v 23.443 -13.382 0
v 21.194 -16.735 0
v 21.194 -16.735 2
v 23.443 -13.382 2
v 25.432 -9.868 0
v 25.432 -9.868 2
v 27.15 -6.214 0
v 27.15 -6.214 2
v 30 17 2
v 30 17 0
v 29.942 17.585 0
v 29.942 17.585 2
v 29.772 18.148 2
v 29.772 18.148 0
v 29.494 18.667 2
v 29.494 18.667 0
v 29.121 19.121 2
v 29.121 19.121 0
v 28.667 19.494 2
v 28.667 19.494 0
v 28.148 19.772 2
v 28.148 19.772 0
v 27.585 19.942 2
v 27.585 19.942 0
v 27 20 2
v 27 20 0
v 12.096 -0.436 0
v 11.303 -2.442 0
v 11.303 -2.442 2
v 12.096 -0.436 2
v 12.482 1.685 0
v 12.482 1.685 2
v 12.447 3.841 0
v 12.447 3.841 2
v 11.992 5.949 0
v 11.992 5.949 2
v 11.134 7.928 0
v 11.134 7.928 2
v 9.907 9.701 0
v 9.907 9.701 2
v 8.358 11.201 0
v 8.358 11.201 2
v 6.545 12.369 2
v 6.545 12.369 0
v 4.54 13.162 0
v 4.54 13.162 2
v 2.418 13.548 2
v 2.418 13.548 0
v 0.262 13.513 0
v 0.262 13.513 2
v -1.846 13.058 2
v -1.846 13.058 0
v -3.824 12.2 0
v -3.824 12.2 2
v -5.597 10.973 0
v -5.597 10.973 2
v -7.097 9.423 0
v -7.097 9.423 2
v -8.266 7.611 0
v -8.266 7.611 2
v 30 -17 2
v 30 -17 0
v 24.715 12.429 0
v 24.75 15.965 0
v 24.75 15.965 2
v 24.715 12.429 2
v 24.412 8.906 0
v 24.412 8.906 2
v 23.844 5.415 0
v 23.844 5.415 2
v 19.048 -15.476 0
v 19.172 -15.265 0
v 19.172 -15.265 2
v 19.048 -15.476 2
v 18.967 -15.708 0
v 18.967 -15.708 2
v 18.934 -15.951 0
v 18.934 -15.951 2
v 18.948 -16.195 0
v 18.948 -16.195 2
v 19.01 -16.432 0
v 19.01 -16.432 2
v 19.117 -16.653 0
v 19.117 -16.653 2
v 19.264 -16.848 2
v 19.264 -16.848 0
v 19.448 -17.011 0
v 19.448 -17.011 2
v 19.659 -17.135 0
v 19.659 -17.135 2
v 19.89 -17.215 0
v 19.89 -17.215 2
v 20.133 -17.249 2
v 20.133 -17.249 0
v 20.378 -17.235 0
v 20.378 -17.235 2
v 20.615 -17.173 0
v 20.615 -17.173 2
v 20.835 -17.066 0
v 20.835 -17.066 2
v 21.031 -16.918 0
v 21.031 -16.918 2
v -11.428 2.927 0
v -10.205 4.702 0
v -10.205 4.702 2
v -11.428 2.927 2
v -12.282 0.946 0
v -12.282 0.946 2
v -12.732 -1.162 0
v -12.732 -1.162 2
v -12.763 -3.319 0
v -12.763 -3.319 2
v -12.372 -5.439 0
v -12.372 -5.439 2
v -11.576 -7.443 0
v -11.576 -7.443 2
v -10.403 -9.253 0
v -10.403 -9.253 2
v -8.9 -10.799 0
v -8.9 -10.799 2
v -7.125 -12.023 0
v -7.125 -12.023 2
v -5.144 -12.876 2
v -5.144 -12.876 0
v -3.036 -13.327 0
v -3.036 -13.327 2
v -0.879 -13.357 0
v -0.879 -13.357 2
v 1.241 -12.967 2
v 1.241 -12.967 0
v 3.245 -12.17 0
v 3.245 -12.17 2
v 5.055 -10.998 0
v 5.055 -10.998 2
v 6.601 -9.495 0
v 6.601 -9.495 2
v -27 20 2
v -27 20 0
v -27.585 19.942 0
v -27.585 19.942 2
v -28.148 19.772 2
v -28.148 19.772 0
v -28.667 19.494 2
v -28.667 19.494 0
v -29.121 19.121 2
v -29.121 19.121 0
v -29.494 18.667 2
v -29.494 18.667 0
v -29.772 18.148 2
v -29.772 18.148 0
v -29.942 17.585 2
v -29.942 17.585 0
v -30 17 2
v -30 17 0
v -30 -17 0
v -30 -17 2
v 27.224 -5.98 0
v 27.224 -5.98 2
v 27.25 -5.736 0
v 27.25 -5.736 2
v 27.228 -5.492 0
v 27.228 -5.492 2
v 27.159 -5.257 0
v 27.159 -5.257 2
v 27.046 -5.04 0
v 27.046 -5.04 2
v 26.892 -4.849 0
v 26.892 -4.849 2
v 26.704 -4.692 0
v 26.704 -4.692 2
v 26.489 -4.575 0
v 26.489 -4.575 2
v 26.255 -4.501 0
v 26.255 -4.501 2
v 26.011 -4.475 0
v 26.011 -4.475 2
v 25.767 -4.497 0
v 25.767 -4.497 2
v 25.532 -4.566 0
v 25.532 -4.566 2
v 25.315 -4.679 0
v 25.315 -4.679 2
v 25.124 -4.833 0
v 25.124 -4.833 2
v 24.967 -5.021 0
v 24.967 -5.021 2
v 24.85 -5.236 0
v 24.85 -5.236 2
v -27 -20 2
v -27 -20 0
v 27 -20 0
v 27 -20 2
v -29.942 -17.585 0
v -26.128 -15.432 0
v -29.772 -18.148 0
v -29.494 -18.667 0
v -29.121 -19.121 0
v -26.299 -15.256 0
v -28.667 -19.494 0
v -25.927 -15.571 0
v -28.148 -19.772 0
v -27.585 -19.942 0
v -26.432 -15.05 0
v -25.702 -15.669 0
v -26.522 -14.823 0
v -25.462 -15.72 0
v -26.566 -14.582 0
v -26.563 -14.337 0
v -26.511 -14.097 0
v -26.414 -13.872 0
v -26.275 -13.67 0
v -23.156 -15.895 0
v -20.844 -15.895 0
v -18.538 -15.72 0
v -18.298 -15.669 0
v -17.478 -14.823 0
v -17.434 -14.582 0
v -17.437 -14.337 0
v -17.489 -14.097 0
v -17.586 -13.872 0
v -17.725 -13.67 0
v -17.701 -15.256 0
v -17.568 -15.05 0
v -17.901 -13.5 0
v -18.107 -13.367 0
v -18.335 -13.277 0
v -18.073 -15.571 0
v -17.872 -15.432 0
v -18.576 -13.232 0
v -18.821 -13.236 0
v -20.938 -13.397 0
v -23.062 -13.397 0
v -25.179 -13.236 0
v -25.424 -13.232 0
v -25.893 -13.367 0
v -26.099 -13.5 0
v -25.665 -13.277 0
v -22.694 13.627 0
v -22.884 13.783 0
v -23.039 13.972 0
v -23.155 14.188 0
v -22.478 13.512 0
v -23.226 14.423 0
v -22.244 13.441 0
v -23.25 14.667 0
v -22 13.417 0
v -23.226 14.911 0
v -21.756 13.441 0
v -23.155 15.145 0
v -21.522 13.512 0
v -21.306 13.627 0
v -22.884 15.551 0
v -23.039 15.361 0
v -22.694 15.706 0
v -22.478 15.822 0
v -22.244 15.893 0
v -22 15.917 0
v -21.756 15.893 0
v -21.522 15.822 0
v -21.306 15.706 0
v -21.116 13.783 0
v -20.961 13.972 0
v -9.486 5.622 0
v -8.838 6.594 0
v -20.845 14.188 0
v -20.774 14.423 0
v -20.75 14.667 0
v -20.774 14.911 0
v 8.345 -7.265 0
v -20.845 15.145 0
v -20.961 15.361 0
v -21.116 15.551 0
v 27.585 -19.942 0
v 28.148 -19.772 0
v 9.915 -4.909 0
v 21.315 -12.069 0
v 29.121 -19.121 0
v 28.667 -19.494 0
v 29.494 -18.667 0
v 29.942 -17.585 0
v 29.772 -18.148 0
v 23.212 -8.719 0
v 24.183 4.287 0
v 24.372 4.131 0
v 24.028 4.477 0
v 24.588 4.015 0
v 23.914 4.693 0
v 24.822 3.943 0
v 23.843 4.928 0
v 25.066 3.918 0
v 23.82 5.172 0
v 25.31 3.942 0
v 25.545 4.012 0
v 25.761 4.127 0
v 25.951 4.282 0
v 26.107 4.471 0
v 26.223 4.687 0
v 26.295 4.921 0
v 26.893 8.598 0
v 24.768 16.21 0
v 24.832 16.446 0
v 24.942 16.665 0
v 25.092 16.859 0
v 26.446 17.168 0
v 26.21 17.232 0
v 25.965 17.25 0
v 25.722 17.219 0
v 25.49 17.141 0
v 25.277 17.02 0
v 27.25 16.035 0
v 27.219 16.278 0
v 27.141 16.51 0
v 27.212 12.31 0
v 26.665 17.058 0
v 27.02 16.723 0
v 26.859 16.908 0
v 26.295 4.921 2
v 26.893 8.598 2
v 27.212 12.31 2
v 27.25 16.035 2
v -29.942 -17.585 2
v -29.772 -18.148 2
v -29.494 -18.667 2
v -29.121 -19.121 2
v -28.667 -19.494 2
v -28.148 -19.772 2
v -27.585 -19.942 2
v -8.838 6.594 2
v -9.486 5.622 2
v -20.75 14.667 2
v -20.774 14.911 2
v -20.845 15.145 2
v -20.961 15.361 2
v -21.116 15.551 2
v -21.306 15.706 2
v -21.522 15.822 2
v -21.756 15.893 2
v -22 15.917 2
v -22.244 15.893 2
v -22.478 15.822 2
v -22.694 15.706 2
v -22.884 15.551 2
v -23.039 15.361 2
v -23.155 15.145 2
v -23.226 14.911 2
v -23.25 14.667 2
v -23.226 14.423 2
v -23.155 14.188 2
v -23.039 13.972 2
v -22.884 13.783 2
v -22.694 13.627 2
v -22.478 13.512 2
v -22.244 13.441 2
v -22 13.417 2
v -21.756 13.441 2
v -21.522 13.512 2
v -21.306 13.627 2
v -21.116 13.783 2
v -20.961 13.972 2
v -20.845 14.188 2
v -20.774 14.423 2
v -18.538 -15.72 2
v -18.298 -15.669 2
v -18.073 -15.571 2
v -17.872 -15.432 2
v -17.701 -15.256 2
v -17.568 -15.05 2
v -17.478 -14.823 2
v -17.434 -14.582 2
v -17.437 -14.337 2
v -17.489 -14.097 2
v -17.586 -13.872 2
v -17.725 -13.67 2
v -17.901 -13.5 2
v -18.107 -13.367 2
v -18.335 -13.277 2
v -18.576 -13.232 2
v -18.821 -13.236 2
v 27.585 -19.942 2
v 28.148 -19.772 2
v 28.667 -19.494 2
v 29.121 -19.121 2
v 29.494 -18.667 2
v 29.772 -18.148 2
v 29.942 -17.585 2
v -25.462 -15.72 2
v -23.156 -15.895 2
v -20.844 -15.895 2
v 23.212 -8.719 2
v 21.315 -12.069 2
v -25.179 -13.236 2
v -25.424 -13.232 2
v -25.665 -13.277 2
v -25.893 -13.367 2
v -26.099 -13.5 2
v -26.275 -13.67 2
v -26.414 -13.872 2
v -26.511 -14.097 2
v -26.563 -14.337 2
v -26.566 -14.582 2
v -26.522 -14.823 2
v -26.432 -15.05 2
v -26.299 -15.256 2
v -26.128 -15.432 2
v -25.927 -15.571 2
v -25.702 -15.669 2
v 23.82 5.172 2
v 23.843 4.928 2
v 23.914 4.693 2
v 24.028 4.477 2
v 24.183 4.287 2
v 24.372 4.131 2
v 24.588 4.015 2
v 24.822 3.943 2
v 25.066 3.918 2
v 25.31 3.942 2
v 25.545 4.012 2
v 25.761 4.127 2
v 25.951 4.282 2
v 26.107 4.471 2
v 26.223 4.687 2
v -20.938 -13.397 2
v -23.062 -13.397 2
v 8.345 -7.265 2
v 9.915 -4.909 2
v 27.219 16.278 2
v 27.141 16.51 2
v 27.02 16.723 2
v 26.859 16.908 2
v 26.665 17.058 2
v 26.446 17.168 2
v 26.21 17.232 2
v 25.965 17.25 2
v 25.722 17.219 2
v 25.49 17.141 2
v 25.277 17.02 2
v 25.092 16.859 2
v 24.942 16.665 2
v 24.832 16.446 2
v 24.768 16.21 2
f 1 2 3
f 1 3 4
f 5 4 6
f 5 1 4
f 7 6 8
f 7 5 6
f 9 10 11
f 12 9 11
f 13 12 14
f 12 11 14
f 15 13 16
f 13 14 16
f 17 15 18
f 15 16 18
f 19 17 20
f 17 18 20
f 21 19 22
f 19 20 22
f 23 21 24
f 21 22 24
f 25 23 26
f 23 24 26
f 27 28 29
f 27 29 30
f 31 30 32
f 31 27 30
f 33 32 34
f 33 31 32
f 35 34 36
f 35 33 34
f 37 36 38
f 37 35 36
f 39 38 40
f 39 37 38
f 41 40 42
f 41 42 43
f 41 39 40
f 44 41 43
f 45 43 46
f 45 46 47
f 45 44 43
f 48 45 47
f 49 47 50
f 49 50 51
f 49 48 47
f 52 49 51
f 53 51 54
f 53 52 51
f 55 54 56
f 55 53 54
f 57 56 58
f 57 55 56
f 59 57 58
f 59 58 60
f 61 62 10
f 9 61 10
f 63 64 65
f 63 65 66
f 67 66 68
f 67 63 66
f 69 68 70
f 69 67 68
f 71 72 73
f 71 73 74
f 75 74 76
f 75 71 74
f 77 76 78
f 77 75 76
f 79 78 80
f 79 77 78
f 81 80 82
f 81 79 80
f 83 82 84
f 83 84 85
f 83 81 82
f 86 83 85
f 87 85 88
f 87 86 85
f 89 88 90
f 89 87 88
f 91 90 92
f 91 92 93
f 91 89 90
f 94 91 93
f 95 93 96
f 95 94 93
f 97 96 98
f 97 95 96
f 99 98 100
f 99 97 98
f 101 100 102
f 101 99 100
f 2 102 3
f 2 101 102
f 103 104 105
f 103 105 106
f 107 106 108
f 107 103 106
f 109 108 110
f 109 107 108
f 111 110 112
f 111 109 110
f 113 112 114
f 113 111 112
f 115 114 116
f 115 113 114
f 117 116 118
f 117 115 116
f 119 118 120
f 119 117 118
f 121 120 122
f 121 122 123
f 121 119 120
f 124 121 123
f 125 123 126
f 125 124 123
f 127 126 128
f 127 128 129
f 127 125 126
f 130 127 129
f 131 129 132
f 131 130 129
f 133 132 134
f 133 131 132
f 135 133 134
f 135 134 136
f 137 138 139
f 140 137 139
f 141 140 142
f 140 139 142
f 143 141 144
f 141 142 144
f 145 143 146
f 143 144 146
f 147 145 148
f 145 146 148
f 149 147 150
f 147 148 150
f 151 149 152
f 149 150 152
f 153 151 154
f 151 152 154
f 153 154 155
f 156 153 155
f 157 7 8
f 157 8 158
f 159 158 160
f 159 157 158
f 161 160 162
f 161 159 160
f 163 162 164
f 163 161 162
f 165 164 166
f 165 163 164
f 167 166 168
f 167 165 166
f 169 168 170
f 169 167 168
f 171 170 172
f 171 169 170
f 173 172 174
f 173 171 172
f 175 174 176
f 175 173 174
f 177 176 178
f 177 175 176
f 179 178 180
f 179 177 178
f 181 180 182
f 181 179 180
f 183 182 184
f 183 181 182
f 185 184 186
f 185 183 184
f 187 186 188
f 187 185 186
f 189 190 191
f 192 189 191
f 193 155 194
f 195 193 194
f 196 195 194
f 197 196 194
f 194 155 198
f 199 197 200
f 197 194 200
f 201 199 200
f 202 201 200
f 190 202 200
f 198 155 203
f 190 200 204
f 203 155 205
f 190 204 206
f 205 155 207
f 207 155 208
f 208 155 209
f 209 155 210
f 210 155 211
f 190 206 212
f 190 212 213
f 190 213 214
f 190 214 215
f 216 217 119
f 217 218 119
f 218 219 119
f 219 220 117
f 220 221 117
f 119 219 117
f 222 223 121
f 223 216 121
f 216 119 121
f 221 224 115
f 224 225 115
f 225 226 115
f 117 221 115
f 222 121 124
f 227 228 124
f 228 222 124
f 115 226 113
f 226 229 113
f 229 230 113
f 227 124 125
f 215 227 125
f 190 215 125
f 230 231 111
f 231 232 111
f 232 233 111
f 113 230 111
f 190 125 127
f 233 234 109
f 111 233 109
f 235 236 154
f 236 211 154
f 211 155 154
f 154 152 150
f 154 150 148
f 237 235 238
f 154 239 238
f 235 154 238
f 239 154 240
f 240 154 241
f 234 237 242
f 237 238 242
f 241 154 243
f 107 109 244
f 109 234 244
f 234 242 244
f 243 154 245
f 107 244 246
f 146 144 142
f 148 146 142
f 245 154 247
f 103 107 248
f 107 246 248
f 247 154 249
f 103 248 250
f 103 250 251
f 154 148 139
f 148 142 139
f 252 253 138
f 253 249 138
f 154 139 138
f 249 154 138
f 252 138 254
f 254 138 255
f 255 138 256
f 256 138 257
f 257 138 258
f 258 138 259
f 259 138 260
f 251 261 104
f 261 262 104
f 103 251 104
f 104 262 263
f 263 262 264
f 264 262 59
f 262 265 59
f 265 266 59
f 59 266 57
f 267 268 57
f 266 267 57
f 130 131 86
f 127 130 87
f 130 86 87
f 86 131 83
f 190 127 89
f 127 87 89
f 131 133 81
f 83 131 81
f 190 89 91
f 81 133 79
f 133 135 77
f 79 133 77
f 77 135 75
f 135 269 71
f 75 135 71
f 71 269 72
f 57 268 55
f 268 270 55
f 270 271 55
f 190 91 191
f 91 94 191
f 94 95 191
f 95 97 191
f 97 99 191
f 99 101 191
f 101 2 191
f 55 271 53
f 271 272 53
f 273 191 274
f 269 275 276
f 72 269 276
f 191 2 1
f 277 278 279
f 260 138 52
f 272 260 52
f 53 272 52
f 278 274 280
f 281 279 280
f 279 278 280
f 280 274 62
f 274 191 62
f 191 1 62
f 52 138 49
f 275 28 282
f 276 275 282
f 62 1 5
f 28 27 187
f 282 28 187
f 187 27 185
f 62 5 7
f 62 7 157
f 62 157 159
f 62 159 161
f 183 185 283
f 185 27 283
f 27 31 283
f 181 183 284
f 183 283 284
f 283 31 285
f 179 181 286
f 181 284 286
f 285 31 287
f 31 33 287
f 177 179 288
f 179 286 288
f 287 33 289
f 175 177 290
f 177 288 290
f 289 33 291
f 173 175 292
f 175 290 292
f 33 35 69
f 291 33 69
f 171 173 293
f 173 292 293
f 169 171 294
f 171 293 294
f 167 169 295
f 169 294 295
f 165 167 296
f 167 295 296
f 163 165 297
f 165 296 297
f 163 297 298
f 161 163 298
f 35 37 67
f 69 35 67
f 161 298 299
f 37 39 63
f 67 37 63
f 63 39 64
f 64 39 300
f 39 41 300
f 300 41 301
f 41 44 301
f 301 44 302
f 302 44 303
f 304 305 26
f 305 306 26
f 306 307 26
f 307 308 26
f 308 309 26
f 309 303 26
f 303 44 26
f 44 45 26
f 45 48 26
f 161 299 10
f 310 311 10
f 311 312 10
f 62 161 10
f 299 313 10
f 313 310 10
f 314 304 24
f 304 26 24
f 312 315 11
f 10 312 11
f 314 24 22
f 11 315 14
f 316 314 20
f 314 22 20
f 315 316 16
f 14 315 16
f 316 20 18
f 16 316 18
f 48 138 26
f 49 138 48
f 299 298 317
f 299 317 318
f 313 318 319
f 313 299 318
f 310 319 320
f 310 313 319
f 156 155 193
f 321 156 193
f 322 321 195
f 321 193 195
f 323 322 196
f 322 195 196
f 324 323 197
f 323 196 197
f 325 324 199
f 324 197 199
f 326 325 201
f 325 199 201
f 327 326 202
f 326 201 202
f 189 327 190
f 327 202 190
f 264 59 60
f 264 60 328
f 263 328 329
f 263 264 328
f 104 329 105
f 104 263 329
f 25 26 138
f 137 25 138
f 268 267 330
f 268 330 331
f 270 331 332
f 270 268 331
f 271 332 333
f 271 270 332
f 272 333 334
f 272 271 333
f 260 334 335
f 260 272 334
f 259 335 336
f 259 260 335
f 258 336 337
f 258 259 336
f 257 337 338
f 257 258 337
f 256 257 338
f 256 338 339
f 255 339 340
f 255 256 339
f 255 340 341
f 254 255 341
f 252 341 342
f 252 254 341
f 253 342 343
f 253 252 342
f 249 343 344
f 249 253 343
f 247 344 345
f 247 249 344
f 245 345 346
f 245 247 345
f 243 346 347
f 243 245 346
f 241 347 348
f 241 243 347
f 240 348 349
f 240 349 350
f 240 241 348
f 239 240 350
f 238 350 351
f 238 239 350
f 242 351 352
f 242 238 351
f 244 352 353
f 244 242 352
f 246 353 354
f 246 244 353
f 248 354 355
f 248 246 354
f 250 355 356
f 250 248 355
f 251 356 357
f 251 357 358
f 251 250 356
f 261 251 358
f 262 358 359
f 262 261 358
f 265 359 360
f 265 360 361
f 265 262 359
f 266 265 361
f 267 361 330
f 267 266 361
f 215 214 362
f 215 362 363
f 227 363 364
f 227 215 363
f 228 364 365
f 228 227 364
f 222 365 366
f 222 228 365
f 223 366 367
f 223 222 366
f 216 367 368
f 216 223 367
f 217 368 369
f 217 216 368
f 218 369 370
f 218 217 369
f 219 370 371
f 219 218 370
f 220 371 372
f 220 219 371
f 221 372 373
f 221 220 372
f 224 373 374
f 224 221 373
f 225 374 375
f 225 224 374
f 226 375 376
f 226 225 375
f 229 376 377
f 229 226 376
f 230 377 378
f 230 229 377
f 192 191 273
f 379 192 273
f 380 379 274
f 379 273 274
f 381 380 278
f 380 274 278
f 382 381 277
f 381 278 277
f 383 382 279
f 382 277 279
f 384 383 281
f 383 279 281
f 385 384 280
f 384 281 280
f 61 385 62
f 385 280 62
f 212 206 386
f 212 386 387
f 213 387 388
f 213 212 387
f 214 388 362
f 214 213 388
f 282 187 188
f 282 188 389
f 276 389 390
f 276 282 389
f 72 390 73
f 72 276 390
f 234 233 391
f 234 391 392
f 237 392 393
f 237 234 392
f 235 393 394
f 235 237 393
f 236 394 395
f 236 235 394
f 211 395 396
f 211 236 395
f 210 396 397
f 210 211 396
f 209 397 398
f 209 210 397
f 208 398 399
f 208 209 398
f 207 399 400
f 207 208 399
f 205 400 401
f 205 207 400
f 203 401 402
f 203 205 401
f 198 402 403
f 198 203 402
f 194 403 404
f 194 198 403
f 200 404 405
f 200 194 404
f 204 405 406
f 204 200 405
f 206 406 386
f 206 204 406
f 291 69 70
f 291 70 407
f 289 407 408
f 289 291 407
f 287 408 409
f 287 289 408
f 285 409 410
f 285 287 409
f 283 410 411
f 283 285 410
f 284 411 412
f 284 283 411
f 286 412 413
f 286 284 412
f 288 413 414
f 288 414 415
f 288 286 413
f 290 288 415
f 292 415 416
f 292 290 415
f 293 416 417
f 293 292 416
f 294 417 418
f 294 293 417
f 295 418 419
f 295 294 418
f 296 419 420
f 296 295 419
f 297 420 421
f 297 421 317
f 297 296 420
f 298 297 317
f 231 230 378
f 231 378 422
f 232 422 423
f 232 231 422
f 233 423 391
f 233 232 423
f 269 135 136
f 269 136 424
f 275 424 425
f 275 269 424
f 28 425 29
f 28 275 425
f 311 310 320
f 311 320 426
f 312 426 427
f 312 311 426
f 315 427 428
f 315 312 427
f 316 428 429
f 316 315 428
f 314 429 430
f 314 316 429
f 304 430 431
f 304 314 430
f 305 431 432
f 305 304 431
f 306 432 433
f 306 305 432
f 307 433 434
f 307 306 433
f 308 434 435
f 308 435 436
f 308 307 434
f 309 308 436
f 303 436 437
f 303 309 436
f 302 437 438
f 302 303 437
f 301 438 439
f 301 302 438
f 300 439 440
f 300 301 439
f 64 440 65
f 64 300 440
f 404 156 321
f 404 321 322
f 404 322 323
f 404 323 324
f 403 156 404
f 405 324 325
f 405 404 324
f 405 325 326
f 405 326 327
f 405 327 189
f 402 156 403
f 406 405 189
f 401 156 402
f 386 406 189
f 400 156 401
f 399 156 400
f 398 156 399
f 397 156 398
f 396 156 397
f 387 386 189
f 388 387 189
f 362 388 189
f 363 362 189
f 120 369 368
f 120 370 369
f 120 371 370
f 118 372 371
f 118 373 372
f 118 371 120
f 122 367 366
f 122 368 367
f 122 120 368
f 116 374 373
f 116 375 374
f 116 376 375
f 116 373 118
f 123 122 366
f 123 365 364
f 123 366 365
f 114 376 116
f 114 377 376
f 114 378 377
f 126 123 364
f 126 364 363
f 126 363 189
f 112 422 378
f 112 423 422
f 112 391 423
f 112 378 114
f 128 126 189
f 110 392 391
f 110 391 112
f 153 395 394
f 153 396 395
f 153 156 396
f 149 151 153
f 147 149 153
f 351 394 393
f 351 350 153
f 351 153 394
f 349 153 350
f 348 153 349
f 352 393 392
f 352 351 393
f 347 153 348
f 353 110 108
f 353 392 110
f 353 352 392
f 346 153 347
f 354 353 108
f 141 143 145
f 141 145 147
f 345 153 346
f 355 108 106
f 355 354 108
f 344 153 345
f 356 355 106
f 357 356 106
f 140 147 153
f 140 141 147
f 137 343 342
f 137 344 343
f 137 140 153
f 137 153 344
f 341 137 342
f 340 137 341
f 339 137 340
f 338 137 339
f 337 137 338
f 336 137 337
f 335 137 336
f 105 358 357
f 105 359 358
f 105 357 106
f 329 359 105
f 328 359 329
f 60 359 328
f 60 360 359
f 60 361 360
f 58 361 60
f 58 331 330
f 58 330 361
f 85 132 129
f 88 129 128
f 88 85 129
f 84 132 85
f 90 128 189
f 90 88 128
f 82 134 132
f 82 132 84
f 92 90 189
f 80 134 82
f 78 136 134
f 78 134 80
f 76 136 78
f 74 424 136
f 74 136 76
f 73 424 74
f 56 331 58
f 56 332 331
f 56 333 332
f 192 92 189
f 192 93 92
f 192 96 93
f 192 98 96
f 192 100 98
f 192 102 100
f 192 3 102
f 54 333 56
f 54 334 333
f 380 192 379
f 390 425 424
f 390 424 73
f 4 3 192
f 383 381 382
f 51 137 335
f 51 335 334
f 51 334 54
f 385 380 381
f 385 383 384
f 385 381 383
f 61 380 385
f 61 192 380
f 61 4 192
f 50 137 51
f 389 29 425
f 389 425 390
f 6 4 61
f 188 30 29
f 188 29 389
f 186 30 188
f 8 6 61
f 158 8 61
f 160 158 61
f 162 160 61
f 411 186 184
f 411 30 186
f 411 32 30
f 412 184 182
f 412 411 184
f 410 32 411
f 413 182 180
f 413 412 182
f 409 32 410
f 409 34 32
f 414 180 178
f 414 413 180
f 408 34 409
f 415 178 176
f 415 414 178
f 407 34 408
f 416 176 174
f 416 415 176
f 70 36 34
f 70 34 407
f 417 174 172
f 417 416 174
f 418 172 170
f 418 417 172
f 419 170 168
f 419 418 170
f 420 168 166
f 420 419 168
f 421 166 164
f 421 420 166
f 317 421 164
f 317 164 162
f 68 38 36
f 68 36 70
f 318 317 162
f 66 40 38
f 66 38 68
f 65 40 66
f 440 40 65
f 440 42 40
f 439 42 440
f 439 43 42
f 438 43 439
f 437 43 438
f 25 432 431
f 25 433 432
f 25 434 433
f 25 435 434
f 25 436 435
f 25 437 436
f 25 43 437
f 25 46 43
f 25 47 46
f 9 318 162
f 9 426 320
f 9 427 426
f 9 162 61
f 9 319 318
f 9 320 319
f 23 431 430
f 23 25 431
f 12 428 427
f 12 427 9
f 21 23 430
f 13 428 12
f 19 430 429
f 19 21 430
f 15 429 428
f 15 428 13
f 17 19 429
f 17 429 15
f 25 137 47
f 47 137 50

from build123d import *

# Parameters (mm, degrees)
SZKIC1_R                    = 1.25
DODANIE_WYCI_GNI_CIE1_DEPTH = 2


with BuildPart() as part:
    # Szkic1 → Dodanie-wyciągnięcie1 (new body)
    with BuildSketch(Plane.XY):
        with BuildLine():
            Line((-27, -20), (27, -20))
            ThreePointArc((27, -20), (29.121320344, -19.121320344), (30, -17))
            Line((30, -17), (30, 17))
            ThreePointArc((30, 17), (29.121320344, 19.121320344), (27, 20))
            Line((27, 20), (-27, 20))
            ThreePointArc((-27, 20), (-29.121320344, 19.121320344), (-30, 17))
            Line((-30, 17), (-30, -17))
            ThreePointArc((-30, -17), (-29.121320344, -19.121320344), (-27, -20))
        make_face()
        with Locations((-22, 14.666666667)):
            Circle(SZKIC1_R, mode=Mode.SUBTRACT)
        with BuildLine():
            ThreePointArc((-25.462131621, -15.720072586), (-22, -15.916666667), (-18.537868379, -15.720072586))
            ThreePointArc((-18.537868379, -15.720072586), (-17.437407577, -14.336603749), (-18.820876413, -13.236142947))
            ThreePointArc((-18.820876413, -13.236142947), (-22, -13.416666667), (-25.179123587, -13.236142947))
            ThreePointArc((-25.179123587, -13.236142947), (-26.562592423, -14.336603749), (-25.462131621, -15.720072586))
        make_face(mode=Mode.SUBTRACT)
        with BuildLine():
            ThreePointArc((26.294998597, 4.920914996), (27.087801786, 10.450711145), (27.249518026, 16.034708834))
            ThreePointArc((27.249518026, 16.034708834), (25.965291166, 17.249518026), (24.750481974, 15.965291166))
            ThreePointArc((24.750481974, 15.965291166), (24.596971596, 10.664638616), (23.8443971, 5.415437293))
            ThreePointArc((23.8443971, 5.415437293), (24.8224367, 3.942875396), (26.294998597, 4.920914996))
        make_face(mode=Mode.SUBTRACT)
        with BuildLine():
            ThreePointArc((21.193691844, -16.735032503), (24.470809822, -11.643513117), (27.150485656, -6.213742466))
            ThreePointArc((27.150485656, -6.213742466), (26.488756334, -4.574500475), (24.849514344, -5.236229797))
            ThreePointArc((24.849514344, -5.236229797), (22.295287061, -10.411806693), (19.171586782, -15.264967497))
            ThreePointArc((19.171586782, -15.264967497), (19.44760681, -17.011052531), (21.193691844, -16.735032503))
        make_face(mode=Mode.SUBTRACT)
        with BuildLine():
            ThreePointArc((6.601254034, -9.49476923), (9.152553238, -6.101702158), (11.303346225, -2.441630943))
            ThreePointArc((11.303346225, -2.441630943), (6.545275723, 12.369201751), (-8.265556972, 7.611131249))
            ThreePointArc((-8.265556972, 7.611131249), (-9.152553238, 6.101702158), (-10.204719988, 4.702386724))
            ThreePointArc((-10.204719988, 4.702386724), (-8.900310954, -10.799178264), (6.601254034, -9.49476923))
        make_face(mode=Mode.SUBTRACT)
    extrude(amount=DODANIE_WYCI_GNI_CIE1_DEPTH)


solid = part.part
